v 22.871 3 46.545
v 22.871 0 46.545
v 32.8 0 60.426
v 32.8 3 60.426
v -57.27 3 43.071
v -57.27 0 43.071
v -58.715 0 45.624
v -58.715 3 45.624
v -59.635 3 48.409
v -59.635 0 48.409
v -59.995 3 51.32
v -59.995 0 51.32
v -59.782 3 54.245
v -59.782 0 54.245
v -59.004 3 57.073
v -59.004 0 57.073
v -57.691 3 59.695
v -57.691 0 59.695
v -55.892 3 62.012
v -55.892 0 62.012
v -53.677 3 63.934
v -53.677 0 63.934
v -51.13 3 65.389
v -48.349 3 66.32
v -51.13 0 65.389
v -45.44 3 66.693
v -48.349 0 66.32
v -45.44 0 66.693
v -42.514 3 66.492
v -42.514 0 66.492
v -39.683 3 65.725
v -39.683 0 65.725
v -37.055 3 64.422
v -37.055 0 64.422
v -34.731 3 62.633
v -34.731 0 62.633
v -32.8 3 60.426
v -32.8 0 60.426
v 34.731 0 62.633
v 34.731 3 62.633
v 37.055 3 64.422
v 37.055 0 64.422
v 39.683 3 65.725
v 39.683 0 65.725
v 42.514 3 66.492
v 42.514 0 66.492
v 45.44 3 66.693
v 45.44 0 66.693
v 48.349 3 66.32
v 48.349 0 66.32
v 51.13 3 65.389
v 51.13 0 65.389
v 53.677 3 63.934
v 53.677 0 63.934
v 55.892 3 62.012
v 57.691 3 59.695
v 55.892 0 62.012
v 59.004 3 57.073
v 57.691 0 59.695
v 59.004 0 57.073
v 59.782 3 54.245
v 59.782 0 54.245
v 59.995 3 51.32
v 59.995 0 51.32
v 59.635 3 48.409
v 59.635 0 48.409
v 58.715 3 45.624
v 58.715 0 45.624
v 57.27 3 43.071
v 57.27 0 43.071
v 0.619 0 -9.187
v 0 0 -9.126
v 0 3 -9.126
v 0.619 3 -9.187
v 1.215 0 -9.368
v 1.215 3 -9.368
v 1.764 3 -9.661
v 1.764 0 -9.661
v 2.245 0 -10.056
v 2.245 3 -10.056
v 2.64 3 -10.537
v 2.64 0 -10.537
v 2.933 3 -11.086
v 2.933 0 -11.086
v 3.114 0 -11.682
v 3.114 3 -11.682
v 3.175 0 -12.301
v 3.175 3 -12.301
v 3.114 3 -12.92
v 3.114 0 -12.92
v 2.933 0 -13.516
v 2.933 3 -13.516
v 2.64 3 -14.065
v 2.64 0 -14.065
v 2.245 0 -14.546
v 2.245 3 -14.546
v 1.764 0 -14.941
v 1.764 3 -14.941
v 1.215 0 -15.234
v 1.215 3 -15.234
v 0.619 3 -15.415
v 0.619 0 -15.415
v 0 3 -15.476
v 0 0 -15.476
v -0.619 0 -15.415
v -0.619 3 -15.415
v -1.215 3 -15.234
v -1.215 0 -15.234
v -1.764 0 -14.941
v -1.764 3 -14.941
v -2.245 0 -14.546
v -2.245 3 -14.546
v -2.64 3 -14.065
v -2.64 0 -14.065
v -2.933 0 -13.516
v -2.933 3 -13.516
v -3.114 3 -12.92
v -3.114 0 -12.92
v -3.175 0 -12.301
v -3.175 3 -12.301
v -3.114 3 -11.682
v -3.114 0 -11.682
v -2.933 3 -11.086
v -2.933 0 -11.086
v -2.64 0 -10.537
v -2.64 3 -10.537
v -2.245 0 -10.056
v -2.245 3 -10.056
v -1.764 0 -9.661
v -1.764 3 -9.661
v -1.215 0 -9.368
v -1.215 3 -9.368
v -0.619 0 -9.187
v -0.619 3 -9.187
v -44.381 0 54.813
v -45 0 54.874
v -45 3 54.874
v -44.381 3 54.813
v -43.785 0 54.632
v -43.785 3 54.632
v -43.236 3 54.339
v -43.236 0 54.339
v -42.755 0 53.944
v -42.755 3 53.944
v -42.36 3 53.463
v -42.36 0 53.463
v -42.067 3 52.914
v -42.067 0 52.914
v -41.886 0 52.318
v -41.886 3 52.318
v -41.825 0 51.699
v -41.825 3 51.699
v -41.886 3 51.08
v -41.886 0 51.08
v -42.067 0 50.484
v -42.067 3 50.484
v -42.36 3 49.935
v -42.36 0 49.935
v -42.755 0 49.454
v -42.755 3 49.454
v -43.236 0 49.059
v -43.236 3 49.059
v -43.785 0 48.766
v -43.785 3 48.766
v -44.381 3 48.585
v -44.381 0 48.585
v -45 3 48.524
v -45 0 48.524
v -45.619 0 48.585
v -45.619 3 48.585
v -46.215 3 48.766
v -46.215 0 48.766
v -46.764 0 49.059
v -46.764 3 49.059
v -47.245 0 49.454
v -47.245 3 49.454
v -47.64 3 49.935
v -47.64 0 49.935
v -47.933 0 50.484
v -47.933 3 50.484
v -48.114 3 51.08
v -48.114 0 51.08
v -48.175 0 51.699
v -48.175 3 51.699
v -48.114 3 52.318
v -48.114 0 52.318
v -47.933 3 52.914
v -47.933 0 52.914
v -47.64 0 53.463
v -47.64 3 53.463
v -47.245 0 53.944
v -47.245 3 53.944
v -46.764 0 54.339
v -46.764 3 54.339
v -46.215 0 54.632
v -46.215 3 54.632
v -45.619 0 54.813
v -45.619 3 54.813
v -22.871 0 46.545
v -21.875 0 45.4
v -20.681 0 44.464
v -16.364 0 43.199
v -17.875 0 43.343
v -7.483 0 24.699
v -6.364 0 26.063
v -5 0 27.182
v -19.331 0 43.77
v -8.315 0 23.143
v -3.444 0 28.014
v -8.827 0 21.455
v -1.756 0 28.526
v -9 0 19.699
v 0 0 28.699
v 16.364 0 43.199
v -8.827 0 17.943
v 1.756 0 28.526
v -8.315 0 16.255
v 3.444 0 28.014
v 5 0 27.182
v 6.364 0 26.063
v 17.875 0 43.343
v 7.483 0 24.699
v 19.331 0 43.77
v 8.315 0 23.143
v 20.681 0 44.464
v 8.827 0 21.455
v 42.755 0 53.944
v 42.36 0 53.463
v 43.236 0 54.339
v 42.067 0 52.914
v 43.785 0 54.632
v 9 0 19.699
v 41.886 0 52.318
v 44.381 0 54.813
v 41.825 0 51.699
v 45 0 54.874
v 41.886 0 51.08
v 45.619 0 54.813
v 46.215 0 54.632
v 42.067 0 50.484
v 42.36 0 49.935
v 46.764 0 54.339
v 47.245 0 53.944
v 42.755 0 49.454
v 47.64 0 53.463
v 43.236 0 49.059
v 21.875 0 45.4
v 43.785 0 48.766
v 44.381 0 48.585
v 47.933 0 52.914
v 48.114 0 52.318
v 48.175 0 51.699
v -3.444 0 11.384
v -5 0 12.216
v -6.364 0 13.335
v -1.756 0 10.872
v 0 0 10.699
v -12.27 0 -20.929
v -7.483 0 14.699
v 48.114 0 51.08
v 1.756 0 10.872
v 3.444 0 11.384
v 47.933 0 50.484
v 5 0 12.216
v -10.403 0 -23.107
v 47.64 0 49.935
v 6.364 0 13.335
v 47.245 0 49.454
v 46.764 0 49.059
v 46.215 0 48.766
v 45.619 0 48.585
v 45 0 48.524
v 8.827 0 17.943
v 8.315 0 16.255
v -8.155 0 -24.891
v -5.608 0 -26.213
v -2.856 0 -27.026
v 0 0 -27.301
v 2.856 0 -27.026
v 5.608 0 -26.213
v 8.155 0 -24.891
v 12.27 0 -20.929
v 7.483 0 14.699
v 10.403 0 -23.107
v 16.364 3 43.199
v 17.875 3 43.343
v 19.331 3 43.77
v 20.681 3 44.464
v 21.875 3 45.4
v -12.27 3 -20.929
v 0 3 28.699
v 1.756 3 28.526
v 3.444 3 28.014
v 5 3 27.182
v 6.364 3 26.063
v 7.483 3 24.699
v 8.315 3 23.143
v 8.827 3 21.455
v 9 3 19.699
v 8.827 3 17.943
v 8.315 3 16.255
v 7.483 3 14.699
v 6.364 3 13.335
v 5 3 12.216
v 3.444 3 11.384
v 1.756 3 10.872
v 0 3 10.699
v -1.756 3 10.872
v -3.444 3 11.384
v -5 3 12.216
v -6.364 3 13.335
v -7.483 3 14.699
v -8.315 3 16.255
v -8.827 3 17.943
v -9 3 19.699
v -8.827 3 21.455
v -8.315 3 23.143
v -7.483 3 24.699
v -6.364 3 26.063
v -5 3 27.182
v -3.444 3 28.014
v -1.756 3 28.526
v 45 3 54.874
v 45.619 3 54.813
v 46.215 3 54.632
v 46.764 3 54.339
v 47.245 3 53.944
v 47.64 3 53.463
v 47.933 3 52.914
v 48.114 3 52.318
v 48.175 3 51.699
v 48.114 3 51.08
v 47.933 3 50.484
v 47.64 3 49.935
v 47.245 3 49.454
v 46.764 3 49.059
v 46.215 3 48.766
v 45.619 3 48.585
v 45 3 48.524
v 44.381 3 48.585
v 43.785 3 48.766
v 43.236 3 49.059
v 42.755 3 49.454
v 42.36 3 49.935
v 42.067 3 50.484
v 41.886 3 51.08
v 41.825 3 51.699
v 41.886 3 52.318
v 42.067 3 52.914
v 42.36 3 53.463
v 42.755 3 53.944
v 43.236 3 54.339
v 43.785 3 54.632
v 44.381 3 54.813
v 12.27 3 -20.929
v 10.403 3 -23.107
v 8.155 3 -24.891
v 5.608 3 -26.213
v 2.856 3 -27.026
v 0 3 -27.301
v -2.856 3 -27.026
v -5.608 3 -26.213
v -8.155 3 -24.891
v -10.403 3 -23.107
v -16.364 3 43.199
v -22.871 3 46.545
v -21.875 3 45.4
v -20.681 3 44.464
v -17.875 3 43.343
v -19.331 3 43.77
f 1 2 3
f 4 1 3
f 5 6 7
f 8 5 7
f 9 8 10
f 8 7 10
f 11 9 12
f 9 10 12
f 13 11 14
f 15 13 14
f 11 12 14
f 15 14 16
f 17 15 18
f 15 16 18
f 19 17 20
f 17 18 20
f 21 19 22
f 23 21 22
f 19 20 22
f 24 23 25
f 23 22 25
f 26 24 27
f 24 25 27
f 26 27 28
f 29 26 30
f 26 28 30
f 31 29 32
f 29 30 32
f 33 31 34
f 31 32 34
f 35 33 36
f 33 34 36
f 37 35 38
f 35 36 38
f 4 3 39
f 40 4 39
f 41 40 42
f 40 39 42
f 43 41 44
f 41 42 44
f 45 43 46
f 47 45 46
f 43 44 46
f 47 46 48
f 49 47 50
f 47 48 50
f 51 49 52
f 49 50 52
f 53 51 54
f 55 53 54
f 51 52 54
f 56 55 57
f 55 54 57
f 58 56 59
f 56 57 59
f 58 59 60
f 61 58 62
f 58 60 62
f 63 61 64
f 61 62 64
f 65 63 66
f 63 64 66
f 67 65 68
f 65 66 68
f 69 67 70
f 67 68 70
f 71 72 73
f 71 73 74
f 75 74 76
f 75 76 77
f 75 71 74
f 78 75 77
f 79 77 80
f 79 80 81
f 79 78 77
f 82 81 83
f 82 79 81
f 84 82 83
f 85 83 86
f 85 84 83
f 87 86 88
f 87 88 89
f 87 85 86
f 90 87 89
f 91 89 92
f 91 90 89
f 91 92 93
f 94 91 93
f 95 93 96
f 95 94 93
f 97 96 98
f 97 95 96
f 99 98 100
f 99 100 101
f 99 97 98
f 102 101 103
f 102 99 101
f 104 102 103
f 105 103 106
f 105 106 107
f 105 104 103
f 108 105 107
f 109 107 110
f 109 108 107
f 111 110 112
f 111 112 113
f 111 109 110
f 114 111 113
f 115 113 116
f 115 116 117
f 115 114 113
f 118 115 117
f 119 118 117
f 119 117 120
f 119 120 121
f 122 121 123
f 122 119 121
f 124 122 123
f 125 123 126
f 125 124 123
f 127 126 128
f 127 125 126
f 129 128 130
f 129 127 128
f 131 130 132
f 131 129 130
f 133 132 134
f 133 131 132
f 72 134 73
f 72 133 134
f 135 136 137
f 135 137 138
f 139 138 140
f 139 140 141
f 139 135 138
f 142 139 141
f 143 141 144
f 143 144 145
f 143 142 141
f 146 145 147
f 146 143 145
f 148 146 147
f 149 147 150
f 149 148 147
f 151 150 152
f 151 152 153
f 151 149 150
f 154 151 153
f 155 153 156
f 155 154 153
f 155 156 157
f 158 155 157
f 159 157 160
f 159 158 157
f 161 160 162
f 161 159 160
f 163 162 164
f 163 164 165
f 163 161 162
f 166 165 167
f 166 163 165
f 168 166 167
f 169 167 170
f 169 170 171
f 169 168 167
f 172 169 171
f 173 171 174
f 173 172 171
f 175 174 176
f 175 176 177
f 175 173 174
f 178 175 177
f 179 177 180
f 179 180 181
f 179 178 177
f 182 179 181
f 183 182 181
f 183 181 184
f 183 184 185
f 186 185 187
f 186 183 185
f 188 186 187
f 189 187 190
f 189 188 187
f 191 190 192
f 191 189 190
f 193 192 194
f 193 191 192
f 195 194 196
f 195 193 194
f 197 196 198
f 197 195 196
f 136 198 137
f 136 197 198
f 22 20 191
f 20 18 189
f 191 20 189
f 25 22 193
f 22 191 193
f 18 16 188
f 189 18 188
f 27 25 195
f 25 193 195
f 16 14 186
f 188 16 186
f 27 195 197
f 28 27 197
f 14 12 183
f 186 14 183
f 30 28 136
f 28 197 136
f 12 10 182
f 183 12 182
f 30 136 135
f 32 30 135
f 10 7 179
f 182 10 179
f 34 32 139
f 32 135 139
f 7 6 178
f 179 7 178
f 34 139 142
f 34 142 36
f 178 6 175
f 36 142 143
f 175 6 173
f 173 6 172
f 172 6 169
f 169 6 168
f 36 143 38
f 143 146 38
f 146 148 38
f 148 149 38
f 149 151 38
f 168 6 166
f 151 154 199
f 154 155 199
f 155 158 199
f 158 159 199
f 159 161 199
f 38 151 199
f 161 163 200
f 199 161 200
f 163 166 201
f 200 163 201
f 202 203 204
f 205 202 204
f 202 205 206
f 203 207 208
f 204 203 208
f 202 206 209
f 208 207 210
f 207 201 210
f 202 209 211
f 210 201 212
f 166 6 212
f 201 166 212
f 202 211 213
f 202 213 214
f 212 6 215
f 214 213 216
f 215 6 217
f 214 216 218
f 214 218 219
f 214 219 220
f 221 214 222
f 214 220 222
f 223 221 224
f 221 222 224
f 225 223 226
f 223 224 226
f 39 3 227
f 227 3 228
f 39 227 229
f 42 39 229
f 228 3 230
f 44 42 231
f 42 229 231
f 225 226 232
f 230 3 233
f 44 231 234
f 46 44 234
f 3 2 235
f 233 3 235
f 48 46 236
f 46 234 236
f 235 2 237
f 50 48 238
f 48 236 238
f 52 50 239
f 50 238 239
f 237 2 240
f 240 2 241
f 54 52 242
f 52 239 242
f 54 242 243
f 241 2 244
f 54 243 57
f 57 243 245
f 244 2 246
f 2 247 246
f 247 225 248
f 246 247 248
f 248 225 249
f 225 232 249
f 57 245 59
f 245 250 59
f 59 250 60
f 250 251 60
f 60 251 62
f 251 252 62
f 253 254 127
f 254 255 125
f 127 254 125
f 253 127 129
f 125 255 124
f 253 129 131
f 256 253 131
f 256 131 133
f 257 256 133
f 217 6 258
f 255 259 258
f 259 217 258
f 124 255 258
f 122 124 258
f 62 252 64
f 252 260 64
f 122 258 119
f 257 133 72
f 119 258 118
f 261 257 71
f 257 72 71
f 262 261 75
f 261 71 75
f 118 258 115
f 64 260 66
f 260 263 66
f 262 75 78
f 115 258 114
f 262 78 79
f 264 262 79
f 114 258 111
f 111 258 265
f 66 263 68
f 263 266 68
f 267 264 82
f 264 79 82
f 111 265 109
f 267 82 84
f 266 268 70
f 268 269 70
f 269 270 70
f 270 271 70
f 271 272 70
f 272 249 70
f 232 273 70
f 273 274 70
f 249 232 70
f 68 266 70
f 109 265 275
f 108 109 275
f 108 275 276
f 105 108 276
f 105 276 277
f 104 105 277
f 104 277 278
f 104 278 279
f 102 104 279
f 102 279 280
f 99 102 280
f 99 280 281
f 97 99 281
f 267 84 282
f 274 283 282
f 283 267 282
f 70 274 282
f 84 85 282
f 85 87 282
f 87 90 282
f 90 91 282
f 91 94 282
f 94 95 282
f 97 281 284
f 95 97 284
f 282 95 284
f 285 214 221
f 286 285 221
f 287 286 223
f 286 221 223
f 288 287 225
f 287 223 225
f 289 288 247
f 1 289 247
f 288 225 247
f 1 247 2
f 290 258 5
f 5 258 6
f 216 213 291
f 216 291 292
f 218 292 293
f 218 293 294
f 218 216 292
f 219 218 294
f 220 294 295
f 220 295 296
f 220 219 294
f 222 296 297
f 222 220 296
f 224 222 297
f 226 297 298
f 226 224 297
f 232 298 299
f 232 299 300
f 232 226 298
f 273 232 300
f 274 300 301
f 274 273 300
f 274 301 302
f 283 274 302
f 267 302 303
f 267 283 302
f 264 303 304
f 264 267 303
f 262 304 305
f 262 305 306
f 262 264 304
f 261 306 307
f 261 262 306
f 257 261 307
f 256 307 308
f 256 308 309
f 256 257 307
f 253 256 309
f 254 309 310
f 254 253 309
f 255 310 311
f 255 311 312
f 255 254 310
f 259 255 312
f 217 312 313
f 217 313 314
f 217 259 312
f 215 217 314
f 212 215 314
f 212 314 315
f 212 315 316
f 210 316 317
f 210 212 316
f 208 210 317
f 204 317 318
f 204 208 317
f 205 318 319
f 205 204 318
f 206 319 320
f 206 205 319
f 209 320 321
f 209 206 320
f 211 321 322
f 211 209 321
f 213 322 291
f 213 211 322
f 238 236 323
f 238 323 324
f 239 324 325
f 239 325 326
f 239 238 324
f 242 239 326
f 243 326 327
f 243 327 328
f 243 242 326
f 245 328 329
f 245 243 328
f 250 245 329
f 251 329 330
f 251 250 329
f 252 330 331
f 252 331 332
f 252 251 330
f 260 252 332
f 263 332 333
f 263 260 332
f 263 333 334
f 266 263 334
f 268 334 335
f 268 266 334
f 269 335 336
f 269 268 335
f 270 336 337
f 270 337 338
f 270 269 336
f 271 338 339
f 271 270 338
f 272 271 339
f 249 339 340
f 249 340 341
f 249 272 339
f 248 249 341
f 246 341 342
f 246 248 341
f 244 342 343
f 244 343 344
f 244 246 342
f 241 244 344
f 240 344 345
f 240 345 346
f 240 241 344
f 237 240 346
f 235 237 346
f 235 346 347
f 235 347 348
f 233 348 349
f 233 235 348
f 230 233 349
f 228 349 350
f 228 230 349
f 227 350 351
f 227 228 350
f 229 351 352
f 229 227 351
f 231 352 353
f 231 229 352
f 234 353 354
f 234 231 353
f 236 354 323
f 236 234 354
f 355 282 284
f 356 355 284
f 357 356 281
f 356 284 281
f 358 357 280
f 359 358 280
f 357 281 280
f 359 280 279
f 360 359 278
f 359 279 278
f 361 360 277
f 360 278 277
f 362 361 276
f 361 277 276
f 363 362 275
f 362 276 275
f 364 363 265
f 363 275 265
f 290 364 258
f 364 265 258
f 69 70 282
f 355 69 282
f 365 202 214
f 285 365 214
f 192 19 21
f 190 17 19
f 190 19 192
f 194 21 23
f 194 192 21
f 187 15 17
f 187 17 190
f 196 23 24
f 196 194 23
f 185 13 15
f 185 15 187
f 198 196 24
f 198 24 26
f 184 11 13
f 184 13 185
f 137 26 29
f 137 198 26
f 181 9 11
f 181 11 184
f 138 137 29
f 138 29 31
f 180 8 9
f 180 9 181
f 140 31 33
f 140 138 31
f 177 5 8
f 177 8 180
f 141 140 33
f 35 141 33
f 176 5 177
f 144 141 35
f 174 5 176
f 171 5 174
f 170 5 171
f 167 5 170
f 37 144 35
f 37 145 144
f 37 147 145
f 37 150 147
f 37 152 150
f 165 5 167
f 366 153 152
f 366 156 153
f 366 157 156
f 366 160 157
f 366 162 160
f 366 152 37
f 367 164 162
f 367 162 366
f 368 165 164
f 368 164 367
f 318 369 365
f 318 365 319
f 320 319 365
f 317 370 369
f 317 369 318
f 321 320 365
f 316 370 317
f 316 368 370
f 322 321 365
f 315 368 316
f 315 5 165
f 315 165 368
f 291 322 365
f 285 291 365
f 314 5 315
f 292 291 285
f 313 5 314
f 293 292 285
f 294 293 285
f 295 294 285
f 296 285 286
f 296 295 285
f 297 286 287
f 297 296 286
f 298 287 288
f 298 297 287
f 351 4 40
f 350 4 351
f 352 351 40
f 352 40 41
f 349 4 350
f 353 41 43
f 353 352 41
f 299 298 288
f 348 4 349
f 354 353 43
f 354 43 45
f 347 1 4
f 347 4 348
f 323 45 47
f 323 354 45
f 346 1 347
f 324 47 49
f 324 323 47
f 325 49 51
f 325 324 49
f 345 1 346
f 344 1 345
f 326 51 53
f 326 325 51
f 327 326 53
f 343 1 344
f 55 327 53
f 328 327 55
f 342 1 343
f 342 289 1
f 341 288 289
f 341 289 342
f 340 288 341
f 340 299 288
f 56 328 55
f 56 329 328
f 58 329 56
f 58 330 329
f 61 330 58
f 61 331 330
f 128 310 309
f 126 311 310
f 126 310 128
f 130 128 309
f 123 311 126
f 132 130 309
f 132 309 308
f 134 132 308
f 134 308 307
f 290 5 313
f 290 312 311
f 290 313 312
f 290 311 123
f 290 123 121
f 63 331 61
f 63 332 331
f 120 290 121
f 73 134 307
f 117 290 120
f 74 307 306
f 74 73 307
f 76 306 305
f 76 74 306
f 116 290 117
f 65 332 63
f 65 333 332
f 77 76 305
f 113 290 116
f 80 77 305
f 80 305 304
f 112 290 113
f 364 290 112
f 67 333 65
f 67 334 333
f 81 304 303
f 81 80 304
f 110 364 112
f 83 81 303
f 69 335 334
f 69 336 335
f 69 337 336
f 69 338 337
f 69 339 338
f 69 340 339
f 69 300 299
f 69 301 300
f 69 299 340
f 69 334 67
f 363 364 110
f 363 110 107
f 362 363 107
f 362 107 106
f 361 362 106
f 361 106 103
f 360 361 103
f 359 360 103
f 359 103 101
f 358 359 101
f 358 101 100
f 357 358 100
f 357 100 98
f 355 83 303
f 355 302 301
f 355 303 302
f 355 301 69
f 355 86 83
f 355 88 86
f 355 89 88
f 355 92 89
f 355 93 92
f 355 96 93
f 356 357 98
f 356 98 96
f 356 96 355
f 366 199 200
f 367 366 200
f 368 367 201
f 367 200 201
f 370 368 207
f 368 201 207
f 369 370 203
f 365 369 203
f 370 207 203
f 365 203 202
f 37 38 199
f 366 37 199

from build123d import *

# Parameters (mm, degrees)
SKETCH1_R           = 9
SKETCH1_R_2         = 3.175
BOSS_EXTRUDE1_DEPTH = 3


with BuildPart() as part:
    # Sketch1 → Boss-Extrude1 (new body)
    with BuildSketch(Plane(origin=(0, 0, 0), x_dir=(1, 0, 0), z_dir=(0, 1, 0))):
        with BuildLine():
            Line((-12.270437376, 20.928622154), (-57.270437376, -43.071377846))
            ThreePointArc((-57.270437376, -43.071377846), (-53.677181673, -63.93449063), (-32.7997143, -60.425599405))
            Line((-32.7997143, -60.425599405), (-22.871154784, -46.544858311))
            ThreePointArc((-22.871154784, -46.544858311), (-20.022657317, -44.084488856), (-16.364335743, -43.199029126))
            Line((-16.364335743, -43.199029126), (16.364335743, -43.199029126))
            ThreePointArc((16.364335743, -43.199029126), (20.022657317, -44.084488856), (22.871154784, -46.544858311))
            Line((22.871154784, -46.544858311), (32.7997143, -60.425599405))
            ThreePointArc((32.7997143, -60.425599405), (53.677181673, -63.93449063), (57.270437376, -43.071377846))
            Line((57.270437376, -43.071377846), (12.270437376, 20.928622154))
            ThreePointArc((12.270437376, 20.928622154), (0, 27.300970874), (-12.270437376, 20.928622154))
        make_face()
        with Locations(Location((0, -19.699029126, 0), (0, 0, 270))):
            Circle(SKETCH1_R, mode=Mode.SUBTRACT)
        with Locations(Location((-45, -51.699029126, 0), (0, 0, 270))):
            Circle(SKETCH1_R_2, mode=Mode.SUBTRACT)
        with Locations(Location((0, 12.300970874, 0), (0, 0, 270))):
            Circle(SKETCH1_R_2, mode=Mode.SUBTRACT)
        with Locations(Location((45, -51.699029126, 0), (0, 0, 270))):
            Circle(SKETCH1_R_2, mode=Mode.SUBTRACT)
    extrude(amount=BOSS_EXTRUDE1_DEPTH)


solid = part.part
